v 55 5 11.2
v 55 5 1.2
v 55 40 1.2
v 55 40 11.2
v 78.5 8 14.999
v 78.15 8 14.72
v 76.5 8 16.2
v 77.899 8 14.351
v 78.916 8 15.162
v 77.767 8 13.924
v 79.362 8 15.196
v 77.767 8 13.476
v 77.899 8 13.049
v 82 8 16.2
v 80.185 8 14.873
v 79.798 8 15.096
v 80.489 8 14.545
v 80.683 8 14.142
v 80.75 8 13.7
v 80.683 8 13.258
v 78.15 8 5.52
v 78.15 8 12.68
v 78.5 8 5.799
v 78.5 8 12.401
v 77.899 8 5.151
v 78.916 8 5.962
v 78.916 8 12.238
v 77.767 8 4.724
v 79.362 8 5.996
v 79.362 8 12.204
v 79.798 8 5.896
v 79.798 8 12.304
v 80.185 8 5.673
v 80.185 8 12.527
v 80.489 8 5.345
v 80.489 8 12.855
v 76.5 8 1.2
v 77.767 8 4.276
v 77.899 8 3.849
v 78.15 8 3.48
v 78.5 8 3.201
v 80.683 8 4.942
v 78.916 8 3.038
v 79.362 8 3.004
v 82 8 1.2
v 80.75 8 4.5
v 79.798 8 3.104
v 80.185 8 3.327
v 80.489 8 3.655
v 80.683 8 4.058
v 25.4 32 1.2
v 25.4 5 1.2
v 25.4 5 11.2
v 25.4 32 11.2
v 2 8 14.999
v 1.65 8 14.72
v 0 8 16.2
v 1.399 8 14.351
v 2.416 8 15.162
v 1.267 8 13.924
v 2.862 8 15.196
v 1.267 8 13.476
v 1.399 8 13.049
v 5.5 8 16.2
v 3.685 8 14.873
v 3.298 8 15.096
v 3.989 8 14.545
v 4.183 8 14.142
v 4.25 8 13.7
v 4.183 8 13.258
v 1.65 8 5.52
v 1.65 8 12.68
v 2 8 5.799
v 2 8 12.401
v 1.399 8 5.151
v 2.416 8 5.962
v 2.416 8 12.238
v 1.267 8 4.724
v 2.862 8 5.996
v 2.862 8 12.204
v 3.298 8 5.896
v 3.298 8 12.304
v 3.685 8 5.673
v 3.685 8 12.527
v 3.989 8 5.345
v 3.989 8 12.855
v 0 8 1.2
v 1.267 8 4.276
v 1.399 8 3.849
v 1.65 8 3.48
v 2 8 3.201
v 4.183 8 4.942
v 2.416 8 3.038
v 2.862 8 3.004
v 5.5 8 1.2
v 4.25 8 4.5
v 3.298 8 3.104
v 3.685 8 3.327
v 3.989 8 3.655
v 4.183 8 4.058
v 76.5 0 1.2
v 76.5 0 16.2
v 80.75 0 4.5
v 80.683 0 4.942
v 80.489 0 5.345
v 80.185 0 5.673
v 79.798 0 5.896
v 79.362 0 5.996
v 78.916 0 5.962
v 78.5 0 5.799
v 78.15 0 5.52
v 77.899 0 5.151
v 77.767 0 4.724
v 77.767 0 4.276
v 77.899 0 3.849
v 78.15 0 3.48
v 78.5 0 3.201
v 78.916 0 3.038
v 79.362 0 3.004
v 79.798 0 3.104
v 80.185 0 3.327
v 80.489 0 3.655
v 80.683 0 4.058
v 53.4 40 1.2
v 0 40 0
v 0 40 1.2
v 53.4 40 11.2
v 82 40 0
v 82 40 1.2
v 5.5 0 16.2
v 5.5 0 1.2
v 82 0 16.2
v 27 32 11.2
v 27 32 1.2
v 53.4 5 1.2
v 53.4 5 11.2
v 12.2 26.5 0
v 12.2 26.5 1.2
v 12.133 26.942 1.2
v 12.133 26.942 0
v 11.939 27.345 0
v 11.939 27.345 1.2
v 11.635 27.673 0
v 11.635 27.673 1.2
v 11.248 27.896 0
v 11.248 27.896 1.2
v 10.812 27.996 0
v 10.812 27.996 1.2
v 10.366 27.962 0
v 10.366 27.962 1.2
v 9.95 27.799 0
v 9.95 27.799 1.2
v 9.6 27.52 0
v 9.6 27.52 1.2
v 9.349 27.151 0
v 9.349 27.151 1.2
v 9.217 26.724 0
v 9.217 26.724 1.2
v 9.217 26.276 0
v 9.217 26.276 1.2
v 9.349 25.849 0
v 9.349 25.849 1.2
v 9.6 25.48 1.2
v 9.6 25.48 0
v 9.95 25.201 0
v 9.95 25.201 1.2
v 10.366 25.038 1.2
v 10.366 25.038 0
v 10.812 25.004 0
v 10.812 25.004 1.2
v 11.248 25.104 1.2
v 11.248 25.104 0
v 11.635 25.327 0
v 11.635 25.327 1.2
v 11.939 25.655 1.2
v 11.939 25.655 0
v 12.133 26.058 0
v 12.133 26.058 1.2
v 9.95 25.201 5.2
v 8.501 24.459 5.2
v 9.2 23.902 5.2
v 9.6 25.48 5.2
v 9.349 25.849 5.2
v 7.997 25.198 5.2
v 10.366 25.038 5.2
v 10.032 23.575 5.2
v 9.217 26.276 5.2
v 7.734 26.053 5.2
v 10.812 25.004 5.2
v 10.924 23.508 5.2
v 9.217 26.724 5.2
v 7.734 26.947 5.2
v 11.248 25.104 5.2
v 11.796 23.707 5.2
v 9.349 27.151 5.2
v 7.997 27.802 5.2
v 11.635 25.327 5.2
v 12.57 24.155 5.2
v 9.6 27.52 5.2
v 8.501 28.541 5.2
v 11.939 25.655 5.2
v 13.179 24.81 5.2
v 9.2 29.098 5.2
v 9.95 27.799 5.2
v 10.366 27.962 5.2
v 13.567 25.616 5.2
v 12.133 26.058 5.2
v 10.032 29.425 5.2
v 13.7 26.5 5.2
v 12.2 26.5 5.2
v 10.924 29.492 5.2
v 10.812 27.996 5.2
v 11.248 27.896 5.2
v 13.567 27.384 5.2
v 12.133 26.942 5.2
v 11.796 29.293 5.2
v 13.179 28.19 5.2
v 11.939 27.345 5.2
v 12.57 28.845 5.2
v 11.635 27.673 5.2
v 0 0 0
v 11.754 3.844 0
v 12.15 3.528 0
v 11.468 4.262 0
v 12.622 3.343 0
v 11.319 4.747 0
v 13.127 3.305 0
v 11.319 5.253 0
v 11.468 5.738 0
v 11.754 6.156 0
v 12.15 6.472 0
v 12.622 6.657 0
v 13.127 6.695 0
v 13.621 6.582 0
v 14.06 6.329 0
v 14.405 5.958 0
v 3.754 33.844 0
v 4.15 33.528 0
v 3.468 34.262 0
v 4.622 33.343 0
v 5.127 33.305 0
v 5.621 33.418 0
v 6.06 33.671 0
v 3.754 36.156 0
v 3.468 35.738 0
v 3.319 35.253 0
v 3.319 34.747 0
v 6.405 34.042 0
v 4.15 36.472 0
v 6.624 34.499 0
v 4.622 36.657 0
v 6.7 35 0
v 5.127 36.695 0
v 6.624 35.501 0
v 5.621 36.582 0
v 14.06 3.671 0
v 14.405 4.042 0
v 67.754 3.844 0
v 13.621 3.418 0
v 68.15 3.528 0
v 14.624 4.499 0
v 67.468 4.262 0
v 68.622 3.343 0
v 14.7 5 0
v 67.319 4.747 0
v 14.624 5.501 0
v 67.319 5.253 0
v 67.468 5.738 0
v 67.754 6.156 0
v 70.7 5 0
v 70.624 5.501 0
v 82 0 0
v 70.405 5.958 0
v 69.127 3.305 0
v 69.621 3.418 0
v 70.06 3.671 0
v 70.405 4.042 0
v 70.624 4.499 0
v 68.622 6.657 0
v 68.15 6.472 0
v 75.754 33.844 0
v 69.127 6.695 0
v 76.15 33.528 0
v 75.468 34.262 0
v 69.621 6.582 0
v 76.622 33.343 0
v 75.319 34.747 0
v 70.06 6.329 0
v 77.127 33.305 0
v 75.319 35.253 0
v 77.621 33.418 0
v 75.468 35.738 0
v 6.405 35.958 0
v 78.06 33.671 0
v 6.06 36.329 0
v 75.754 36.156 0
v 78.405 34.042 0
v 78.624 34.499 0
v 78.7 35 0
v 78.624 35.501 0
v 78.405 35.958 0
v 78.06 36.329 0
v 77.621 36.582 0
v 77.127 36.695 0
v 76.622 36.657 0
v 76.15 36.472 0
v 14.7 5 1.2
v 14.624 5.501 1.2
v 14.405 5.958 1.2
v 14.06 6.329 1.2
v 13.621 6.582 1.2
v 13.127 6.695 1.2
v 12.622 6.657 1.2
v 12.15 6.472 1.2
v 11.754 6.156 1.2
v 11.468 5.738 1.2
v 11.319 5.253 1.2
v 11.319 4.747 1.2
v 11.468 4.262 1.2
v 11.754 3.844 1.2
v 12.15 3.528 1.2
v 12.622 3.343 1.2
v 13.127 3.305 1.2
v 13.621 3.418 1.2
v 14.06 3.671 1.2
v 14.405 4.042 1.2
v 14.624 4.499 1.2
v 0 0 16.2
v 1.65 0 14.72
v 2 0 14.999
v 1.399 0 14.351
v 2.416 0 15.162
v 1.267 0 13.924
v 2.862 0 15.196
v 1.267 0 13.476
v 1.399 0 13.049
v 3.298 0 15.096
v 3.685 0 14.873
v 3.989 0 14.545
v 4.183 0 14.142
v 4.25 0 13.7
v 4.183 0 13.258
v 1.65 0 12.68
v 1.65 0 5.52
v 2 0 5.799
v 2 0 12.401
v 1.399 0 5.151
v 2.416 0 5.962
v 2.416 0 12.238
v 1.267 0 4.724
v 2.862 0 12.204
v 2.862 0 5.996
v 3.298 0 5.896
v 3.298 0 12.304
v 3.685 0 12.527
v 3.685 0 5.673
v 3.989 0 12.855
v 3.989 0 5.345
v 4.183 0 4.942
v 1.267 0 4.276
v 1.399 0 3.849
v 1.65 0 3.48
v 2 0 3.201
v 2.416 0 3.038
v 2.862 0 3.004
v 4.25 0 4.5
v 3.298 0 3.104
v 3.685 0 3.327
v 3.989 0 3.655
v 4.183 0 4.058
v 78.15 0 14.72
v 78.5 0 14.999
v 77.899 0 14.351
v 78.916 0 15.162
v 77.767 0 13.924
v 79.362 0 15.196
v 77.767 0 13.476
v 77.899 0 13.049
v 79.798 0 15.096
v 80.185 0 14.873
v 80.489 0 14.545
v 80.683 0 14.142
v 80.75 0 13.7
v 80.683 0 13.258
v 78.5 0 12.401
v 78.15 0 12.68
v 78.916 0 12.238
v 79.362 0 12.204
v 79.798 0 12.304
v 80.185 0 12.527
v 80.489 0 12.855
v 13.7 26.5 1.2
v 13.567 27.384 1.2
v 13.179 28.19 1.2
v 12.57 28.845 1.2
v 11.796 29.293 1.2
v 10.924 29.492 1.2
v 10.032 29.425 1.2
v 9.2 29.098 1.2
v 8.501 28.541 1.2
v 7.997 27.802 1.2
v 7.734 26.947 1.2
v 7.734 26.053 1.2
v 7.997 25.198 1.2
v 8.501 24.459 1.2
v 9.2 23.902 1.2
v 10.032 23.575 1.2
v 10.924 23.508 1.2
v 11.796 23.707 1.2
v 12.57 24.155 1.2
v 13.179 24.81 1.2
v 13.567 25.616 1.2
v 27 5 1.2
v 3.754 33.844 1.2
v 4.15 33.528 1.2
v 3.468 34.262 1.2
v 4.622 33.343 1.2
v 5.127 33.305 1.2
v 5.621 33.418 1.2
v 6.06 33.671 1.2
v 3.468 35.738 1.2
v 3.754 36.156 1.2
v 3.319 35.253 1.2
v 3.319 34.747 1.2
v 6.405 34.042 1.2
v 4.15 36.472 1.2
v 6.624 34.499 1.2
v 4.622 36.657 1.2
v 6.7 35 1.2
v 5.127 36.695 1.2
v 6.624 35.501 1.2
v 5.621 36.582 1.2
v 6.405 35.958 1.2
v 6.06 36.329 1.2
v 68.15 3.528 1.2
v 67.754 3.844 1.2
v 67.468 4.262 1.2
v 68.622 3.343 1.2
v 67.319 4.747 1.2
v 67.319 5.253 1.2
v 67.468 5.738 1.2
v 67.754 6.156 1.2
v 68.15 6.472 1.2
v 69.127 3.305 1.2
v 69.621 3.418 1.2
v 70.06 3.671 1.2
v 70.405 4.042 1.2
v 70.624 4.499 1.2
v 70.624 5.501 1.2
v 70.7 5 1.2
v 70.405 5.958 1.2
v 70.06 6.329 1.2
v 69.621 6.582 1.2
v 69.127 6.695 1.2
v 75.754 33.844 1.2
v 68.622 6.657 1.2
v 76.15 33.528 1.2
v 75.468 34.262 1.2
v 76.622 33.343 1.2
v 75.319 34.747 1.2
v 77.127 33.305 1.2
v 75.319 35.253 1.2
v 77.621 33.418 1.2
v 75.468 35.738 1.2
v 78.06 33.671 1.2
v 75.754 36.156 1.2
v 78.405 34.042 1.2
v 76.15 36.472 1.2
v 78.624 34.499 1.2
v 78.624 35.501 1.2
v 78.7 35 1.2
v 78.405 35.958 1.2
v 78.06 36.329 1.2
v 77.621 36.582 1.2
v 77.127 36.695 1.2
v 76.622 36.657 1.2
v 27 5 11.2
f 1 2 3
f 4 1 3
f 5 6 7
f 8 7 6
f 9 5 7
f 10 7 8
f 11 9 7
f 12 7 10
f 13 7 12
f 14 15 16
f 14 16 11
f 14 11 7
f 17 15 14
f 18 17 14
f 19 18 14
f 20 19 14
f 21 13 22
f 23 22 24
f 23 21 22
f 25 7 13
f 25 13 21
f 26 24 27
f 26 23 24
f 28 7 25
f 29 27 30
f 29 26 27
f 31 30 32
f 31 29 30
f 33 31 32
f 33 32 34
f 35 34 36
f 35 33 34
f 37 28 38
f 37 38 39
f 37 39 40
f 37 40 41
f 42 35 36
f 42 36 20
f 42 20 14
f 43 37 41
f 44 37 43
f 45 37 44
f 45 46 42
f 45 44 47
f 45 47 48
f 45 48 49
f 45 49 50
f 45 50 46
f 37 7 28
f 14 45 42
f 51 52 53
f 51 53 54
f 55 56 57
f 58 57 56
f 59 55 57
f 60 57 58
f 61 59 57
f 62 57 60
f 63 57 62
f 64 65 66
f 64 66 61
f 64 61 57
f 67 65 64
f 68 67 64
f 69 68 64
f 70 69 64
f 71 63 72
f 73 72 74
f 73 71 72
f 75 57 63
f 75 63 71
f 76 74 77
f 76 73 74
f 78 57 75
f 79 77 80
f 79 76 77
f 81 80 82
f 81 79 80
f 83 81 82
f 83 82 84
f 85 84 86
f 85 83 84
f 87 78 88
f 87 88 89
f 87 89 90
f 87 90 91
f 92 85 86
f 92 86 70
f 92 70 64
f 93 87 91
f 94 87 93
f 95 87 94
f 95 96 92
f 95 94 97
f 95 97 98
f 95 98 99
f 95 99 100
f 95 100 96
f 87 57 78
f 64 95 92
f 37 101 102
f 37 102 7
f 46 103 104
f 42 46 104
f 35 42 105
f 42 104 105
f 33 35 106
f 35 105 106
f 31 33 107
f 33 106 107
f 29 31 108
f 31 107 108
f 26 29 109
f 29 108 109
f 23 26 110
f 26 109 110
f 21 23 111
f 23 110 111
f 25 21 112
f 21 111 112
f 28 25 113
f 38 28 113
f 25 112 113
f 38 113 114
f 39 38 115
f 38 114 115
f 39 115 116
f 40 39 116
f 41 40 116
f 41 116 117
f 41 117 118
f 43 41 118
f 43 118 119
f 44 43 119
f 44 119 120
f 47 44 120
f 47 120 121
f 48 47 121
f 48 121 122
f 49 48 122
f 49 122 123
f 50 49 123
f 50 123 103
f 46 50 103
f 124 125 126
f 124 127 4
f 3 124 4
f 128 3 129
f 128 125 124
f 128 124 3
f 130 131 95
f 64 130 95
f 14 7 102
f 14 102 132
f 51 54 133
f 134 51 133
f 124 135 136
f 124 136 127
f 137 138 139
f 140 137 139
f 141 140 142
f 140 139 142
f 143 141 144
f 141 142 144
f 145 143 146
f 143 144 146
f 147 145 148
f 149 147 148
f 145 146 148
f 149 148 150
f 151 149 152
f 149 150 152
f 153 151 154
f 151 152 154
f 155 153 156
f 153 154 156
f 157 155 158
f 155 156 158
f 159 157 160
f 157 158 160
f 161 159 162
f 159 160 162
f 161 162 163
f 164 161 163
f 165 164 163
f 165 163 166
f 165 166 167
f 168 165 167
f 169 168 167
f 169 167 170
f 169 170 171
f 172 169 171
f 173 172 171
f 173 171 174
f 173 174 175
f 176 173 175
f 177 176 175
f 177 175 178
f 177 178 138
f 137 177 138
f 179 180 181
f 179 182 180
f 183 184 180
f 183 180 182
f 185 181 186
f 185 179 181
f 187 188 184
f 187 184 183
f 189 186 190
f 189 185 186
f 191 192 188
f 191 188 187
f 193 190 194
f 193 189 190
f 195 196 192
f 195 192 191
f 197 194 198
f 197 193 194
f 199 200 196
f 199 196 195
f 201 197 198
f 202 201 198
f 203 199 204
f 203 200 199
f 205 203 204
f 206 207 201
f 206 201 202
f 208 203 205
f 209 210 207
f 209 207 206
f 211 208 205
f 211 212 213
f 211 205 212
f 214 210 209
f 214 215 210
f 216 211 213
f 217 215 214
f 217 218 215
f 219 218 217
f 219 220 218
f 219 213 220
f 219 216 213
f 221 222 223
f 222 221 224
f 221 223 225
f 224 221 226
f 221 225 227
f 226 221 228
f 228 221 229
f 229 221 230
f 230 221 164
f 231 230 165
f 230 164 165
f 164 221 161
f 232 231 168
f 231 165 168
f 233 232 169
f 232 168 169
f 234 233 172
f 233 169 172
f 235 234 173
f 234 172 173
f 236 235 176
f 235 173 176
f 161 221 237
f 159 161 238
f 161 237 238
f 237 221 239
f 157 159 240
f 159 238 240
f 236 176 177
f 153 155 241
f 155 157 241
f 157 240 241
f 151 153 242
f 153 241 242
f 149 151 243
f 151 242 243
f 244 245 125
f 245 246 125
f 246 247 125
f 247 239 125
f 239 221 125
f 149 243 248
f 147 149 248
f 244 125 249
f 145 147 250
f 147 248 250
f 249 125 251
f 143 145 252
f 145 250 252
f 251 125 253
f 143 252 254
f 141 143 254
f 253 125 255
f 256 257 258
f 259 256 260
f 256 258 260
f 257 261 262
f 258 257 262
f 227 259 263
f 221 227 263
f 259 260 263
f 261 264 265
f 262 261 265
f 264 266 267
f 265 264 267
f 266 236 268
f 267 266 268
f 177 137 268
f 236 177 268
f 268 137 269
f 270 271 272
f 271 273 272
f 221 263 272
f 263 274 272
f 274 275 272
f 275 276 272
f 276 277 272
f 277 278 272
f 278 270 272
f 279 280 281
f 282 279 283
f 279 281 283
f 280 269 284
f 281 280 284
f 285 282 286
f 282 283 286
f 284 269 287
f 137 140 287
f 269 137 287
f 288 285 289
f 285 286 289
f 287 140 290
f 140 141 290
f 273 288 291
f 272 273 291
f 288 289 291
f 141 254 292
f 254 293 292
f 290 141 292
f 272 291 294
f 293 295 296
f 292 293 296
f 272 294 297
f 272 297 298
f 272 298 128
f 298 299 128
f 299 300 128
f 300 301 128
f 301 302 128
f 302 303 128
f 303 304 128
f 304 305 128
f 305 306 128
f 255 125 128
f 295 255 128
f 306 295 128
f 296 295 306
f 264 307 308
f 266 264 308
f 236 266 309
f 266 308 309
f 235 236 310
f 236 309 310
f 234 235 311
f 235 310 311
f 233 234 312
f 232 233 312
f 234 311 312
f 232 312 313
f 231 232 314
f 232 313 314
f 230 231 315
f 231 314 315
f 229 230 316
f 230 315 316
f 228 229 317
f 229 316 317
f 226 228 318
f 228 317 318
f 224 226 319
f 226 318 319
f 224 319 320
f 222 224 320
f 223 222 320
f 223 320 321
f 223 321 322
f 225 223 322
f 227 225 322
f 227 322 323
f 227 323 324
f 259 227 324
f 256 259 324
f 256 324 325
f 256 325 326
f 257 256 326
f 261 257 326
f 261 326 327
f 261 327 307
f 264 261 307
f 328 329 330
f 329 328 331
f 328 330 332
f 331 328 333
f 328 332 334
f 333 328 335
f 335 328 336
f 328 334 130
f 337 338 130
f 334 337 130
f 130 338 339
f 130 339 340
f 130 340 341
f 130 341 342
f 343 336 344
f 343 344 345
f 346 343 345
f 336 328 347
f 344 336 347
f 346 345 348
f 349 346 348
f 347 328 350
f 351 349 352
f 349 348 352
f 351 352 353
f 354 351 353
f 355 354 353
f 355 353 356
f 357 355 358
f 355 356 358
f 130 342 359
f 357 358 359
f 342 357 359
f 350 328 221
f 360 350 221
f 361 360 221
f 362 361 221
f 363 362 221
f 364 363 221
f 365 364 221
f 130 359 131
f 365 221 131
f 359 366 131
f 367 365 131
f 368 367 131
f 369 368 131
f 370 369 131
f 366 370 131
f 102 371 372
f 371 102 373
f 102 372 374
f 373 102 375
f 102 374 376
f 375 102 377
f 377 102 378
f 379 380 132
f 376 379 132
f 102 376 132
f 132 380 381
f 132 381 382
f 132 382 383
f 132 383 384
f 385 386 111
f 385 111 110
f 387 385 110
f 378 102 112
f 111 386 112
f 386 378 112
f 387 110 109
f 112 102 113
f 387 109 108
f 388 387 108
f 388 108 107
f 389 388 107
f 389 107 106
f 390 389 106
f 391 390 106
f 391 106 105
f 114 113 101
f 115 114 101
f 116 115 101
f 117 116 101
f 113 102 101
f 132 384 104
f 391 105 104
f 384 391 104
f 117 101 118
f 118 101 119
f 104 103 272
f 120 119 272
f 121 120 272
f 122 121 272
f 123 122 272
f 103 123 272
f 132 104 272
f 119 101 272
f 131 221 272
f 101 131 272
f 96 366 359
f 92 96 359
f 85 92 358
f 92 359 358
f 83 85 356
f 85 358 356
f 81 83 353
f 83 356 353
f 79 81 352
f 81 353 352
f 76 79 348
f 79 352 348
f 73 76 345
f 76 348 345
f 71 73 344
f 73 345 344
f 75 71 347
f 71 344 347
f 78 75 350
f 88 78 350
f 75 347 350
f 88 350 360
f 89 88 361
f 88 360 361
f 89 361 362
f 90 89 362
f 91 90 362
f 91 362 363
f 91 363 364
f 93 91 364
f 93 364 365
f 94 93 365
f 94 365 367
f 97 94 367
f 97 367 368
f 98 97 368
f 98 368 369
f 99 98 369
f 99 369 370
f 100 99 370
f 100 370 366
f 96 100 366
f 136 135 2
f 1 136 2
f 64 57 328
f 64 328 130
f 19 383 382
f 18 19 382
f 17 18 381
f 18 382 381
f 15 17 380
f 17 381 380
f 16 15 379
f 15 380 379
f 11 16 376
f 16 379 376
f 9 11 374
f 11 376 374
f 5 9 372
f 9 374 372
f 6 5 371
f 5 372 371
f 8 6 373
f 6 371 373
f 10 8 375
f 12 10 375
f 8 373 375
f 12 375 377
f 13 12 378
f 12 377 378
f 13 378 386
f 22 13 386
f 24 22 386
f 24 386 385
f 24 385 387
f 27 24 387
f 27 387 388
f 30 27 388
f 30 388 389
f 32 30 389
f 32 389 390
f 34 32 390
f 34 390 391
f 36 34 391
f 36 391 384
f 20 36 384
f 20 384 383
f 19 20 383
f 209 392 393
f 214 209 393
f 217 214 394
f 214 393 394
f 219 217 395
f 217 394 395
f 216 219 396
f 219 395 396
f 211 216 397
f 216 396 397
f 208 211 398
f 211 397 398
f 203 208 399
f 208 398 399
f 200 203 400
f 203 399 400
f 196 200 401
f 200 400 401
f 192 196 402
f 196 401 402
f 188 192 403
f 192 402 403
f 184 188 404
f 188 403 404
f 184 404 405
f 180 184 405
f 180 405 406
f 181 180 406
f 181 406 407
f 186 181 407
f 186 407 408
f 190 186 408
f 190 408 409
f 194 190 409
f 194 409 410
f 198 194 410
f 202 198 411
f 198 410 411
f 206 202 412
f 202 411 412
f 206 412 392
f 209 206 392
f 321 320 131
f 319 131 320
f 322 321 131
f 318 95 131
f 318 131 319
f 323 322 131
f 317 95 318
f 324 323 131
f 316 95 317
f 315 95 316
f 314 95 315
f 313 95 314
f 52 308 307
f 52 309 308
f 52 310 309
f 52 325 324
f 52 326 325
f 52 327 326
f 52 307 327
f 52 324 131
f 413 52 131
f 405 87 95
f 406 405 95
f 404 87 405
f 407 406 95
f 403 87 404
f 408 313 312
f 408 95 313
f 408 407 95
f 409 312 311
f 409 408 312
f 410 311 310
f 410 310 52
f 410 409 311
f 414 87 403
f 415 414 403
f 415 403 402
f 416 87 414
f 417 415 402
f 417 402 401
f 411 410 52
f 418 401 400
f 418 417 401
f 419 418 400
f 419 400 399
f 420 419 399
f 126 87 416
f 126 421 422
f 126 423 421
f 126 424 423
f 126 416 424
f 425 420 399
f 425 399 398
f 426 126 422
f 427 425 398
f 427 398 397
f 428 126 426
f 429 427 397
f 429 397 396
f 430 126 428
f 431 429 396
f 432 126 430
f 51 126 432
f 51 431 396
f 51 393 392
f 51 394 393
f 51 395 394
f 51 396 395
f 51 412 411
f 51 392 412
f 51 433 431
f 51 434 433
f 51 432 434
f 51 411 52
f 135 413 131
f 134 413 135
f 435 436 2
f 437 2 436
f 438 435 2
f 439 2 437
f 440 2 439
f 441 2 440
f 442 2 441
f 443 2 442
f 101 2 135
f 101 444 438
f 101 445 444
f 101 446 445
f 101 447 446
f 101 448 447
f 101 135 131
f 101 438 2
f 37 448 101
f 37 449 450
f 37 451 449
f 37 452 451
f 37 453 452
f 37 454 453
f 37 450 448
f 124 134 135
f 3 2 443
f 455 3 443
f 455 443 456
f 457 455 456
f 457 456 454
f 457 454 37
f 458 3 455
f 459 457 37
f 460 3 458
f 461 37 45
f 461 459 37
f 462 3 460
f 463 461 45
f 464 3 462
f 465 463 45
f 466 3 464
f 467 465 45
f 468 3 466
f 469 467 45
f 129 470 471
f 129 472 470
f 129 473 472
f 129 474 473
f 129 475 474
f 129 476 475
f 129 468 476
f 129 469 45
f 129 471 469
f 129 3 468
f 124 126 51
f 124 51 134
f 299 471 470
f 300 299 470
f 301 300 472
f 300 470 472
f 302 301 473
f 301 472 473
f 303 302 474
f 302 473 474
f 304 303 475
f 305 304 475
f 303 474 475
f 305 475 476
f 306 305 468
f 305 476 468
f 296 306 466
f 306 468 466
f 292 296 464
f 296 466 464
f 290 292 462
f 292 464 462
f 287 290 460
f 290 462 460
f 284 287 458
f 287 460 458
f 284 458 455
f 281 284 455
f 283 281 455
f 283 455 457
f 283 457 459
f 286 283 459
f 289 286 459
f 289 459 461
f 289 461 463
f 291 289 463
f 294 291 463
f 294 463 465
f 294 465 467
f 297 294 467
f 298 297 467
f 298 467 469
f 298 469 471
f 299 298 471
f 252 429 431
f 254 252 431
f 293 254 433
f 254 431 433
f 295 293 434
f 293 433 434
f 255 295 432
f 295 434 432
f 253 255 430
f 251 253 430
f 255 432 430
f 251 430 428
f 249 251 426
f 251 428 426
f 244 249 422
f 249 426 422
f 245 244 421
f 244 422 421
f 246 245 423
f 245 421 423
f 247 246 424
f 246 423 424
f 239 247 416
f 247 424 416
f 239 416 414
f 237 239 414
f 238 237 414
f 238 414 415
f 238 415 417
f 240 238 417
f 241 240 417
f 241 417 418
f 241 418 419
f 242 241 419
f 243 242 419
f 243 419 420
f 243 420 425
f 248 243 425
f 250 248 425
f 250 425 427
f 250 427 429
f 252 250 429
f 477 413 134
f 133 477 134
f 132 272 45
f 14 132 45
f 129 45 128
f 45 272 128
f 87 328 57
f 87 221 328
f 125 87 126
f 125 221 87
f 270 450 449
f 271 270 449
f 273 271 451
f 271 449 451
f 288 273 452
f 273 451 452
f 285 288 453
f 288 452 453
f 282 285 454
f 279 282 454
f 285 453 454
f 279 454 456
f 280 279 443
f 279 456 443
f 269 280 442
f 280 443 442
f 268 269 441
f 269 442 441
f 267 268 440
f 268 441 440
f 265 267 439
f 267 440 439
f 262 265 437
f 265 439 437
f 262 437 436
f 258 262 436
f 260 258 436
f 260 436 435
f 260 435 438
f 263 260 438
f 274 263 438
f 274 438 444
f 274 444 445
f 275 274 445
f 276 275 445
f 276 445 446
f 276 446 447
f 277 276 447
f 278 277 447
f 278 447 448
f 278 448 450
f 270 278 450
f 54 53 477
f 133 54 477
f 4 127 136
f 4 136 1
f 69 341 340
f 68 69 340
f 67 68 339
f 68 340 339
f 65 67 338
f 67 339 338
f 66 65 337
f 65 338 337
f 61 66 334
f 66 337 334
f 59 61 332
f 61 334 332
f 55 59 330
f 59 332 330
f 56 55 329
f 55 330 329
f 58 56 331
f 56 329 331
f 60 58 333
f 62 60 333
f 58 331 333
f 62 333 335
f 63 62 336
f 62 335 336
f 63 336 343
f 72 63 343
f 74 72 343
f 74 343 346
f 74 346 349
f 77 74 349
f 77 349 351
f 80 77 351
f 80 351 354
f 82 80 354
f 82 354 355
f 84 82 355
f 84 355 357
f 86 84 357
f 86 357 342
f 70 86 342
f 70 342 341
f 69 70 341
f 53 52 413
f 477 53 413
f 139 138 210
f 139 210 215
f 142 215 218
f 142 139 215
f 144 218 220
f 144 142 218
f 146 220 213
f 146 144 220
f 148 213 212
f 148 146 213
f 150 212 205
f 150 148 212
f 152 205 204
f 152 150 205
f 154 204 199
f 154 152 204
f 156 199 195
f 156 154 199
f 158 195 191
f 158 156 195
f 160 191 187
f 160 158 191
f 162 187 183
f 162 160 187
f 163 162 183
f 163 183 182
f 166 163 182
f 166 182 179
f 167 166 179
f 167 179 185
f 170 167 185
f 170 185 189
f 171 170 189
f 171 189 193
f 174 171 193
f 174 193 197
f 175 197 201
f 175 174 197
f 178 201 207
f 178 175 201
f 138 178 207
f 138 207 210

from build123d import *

# Parameters (mm, degrees)
SKETCH_W        = 82
SKETCH_H        = 40
PAD_DEPTH       = 1.2
SKETCH001_W     = 5.5
SKETCH001_H     = 8
PAD001_DEPTH    = 15
SKETCH002_R     = 1.5
POCKET_DEPTH    = 40.001
SKETCH003_W     = 1.6
SKETCH003_H     = 35
PAD002_DEPTH    = 10
SKETCH004_R     = 3
SKETCH004_R_2   = 1.5
PAD003_DEPTH    = 4
SKETCH005_R     = 1.7
POCKET001_DEPTH = 1.201
SKETCH006_R     = 1.5
POCKET002_DEPTH = 1.201
SKETCH007_W     = 1.6
SKETCH007_H     = 8
POCKET003_DEPTH = 10


with BuildPart() as part:
    # Sketch → Pad (new body)
    with BuildSketch(Plane.XY):
        with Locations((41, 20)):
            Rectangle(SKETCH_W, SKETCH_H)
    extrude(amount=PAD_DEPTH)

    # Sketch001 (on Face6 of Pad) → Pad001 (join)
    with BuildSketch(Plane.XY.offset(1.2)):
        with Locations((2.75, 4)):
            Rectangle(SKETCH001_W, SKETCH001_H)
        with Locations((79.25, 4)):
            Rectangle(SKETCH001_W, SKETCH001_H)
    extrude(amount=PAD001_DEPTH)

    # Sketch002 (on Face5 of Pad001) → Pocket (cut, through all)
    with BuildSketch(Plane.XZ):
        with Locations((2.75, 13.7)):
            Circle(SKETCH002_R)
        with Locations((2.75, 4.5)):
            Circle(SKETCH002_R)
        with Locations((79.25, 13.7)):
            Circle(SKETCH002_R)
        with Locations((79.25, 4.5)):
            Circle(SKETCH002_R)
    extrude(amount=-POCKET_DEPTH, mode=Mode.SUBTRACT)

    # Sketch003 (on Face6 of Pocket) → Pad002 (join)
    with BuildSketch(Plane.XY.offset(1.2)):
        with Locations((26.2, 22.5)):
            Rectangle(SKETCH003_W, SKETCH003_H)
        with Locations((54.2, 22.5)):
            Rectangle(SKETCH003_W, SKETCH003_H)
    extrude(amount=PAD002_DEPTH)

    # Sketch004 (on Face6 of Pad002) → Pad003 (join)
    with BuildSketch(Plane.XY.offset(1.2)):
        with Locations((10.7, 26.5)):
            Circle(SKETCH004_R)
        with Locations((10.7, 26.5)):
            Circle(SKETCH004_R_2, mode=Mode.SUBTRACT)
    extrude(amount=PAD003_DEPTH)

    # Sketch005 (on Face6 of Pad003) → Pocket001 (cut, through all)
    with BuildSketch(Plane.XY.offset(1.2)):
        with Locations((5, 35)):
            Circle(SKETCH005_R)
        with Locations((77, 35)):
            Circle(SKETCH005_R)
        with Locations((69, 5)):
            Circle(SKETCH005_R)
        with Locations((13, 5)):
            Circle(SKETCH005_R)
    extrude(amount=-POCKET001_DEPTH, mode=Mode.SUBTRACT)

    # Sketch006 (on Face38 of Pocket001) → Pocket002 (cut, through all)
    with BuildSketch(Plane.XY.offset(1.2)):
        with Locations((10.7, 26.5)):
            Circle(SKETCH006_R)
    extrude(amount=-POCKET002_DEPTH, mode=Mode.SUBTRACT)

    # Sketch007 (on Face36 of Pocket002) → Pocket003 (cut)
    with BuildSketch(Plane.XY.offset(11.2)):
        with Locations((26.2, 36)):
            Rectangle(SKETCH007_W, SKETCH007_H)
    extrude(amount=-POCKET003_DEPTH, mode=Mode.SUBTRACT)


solid = part.part
